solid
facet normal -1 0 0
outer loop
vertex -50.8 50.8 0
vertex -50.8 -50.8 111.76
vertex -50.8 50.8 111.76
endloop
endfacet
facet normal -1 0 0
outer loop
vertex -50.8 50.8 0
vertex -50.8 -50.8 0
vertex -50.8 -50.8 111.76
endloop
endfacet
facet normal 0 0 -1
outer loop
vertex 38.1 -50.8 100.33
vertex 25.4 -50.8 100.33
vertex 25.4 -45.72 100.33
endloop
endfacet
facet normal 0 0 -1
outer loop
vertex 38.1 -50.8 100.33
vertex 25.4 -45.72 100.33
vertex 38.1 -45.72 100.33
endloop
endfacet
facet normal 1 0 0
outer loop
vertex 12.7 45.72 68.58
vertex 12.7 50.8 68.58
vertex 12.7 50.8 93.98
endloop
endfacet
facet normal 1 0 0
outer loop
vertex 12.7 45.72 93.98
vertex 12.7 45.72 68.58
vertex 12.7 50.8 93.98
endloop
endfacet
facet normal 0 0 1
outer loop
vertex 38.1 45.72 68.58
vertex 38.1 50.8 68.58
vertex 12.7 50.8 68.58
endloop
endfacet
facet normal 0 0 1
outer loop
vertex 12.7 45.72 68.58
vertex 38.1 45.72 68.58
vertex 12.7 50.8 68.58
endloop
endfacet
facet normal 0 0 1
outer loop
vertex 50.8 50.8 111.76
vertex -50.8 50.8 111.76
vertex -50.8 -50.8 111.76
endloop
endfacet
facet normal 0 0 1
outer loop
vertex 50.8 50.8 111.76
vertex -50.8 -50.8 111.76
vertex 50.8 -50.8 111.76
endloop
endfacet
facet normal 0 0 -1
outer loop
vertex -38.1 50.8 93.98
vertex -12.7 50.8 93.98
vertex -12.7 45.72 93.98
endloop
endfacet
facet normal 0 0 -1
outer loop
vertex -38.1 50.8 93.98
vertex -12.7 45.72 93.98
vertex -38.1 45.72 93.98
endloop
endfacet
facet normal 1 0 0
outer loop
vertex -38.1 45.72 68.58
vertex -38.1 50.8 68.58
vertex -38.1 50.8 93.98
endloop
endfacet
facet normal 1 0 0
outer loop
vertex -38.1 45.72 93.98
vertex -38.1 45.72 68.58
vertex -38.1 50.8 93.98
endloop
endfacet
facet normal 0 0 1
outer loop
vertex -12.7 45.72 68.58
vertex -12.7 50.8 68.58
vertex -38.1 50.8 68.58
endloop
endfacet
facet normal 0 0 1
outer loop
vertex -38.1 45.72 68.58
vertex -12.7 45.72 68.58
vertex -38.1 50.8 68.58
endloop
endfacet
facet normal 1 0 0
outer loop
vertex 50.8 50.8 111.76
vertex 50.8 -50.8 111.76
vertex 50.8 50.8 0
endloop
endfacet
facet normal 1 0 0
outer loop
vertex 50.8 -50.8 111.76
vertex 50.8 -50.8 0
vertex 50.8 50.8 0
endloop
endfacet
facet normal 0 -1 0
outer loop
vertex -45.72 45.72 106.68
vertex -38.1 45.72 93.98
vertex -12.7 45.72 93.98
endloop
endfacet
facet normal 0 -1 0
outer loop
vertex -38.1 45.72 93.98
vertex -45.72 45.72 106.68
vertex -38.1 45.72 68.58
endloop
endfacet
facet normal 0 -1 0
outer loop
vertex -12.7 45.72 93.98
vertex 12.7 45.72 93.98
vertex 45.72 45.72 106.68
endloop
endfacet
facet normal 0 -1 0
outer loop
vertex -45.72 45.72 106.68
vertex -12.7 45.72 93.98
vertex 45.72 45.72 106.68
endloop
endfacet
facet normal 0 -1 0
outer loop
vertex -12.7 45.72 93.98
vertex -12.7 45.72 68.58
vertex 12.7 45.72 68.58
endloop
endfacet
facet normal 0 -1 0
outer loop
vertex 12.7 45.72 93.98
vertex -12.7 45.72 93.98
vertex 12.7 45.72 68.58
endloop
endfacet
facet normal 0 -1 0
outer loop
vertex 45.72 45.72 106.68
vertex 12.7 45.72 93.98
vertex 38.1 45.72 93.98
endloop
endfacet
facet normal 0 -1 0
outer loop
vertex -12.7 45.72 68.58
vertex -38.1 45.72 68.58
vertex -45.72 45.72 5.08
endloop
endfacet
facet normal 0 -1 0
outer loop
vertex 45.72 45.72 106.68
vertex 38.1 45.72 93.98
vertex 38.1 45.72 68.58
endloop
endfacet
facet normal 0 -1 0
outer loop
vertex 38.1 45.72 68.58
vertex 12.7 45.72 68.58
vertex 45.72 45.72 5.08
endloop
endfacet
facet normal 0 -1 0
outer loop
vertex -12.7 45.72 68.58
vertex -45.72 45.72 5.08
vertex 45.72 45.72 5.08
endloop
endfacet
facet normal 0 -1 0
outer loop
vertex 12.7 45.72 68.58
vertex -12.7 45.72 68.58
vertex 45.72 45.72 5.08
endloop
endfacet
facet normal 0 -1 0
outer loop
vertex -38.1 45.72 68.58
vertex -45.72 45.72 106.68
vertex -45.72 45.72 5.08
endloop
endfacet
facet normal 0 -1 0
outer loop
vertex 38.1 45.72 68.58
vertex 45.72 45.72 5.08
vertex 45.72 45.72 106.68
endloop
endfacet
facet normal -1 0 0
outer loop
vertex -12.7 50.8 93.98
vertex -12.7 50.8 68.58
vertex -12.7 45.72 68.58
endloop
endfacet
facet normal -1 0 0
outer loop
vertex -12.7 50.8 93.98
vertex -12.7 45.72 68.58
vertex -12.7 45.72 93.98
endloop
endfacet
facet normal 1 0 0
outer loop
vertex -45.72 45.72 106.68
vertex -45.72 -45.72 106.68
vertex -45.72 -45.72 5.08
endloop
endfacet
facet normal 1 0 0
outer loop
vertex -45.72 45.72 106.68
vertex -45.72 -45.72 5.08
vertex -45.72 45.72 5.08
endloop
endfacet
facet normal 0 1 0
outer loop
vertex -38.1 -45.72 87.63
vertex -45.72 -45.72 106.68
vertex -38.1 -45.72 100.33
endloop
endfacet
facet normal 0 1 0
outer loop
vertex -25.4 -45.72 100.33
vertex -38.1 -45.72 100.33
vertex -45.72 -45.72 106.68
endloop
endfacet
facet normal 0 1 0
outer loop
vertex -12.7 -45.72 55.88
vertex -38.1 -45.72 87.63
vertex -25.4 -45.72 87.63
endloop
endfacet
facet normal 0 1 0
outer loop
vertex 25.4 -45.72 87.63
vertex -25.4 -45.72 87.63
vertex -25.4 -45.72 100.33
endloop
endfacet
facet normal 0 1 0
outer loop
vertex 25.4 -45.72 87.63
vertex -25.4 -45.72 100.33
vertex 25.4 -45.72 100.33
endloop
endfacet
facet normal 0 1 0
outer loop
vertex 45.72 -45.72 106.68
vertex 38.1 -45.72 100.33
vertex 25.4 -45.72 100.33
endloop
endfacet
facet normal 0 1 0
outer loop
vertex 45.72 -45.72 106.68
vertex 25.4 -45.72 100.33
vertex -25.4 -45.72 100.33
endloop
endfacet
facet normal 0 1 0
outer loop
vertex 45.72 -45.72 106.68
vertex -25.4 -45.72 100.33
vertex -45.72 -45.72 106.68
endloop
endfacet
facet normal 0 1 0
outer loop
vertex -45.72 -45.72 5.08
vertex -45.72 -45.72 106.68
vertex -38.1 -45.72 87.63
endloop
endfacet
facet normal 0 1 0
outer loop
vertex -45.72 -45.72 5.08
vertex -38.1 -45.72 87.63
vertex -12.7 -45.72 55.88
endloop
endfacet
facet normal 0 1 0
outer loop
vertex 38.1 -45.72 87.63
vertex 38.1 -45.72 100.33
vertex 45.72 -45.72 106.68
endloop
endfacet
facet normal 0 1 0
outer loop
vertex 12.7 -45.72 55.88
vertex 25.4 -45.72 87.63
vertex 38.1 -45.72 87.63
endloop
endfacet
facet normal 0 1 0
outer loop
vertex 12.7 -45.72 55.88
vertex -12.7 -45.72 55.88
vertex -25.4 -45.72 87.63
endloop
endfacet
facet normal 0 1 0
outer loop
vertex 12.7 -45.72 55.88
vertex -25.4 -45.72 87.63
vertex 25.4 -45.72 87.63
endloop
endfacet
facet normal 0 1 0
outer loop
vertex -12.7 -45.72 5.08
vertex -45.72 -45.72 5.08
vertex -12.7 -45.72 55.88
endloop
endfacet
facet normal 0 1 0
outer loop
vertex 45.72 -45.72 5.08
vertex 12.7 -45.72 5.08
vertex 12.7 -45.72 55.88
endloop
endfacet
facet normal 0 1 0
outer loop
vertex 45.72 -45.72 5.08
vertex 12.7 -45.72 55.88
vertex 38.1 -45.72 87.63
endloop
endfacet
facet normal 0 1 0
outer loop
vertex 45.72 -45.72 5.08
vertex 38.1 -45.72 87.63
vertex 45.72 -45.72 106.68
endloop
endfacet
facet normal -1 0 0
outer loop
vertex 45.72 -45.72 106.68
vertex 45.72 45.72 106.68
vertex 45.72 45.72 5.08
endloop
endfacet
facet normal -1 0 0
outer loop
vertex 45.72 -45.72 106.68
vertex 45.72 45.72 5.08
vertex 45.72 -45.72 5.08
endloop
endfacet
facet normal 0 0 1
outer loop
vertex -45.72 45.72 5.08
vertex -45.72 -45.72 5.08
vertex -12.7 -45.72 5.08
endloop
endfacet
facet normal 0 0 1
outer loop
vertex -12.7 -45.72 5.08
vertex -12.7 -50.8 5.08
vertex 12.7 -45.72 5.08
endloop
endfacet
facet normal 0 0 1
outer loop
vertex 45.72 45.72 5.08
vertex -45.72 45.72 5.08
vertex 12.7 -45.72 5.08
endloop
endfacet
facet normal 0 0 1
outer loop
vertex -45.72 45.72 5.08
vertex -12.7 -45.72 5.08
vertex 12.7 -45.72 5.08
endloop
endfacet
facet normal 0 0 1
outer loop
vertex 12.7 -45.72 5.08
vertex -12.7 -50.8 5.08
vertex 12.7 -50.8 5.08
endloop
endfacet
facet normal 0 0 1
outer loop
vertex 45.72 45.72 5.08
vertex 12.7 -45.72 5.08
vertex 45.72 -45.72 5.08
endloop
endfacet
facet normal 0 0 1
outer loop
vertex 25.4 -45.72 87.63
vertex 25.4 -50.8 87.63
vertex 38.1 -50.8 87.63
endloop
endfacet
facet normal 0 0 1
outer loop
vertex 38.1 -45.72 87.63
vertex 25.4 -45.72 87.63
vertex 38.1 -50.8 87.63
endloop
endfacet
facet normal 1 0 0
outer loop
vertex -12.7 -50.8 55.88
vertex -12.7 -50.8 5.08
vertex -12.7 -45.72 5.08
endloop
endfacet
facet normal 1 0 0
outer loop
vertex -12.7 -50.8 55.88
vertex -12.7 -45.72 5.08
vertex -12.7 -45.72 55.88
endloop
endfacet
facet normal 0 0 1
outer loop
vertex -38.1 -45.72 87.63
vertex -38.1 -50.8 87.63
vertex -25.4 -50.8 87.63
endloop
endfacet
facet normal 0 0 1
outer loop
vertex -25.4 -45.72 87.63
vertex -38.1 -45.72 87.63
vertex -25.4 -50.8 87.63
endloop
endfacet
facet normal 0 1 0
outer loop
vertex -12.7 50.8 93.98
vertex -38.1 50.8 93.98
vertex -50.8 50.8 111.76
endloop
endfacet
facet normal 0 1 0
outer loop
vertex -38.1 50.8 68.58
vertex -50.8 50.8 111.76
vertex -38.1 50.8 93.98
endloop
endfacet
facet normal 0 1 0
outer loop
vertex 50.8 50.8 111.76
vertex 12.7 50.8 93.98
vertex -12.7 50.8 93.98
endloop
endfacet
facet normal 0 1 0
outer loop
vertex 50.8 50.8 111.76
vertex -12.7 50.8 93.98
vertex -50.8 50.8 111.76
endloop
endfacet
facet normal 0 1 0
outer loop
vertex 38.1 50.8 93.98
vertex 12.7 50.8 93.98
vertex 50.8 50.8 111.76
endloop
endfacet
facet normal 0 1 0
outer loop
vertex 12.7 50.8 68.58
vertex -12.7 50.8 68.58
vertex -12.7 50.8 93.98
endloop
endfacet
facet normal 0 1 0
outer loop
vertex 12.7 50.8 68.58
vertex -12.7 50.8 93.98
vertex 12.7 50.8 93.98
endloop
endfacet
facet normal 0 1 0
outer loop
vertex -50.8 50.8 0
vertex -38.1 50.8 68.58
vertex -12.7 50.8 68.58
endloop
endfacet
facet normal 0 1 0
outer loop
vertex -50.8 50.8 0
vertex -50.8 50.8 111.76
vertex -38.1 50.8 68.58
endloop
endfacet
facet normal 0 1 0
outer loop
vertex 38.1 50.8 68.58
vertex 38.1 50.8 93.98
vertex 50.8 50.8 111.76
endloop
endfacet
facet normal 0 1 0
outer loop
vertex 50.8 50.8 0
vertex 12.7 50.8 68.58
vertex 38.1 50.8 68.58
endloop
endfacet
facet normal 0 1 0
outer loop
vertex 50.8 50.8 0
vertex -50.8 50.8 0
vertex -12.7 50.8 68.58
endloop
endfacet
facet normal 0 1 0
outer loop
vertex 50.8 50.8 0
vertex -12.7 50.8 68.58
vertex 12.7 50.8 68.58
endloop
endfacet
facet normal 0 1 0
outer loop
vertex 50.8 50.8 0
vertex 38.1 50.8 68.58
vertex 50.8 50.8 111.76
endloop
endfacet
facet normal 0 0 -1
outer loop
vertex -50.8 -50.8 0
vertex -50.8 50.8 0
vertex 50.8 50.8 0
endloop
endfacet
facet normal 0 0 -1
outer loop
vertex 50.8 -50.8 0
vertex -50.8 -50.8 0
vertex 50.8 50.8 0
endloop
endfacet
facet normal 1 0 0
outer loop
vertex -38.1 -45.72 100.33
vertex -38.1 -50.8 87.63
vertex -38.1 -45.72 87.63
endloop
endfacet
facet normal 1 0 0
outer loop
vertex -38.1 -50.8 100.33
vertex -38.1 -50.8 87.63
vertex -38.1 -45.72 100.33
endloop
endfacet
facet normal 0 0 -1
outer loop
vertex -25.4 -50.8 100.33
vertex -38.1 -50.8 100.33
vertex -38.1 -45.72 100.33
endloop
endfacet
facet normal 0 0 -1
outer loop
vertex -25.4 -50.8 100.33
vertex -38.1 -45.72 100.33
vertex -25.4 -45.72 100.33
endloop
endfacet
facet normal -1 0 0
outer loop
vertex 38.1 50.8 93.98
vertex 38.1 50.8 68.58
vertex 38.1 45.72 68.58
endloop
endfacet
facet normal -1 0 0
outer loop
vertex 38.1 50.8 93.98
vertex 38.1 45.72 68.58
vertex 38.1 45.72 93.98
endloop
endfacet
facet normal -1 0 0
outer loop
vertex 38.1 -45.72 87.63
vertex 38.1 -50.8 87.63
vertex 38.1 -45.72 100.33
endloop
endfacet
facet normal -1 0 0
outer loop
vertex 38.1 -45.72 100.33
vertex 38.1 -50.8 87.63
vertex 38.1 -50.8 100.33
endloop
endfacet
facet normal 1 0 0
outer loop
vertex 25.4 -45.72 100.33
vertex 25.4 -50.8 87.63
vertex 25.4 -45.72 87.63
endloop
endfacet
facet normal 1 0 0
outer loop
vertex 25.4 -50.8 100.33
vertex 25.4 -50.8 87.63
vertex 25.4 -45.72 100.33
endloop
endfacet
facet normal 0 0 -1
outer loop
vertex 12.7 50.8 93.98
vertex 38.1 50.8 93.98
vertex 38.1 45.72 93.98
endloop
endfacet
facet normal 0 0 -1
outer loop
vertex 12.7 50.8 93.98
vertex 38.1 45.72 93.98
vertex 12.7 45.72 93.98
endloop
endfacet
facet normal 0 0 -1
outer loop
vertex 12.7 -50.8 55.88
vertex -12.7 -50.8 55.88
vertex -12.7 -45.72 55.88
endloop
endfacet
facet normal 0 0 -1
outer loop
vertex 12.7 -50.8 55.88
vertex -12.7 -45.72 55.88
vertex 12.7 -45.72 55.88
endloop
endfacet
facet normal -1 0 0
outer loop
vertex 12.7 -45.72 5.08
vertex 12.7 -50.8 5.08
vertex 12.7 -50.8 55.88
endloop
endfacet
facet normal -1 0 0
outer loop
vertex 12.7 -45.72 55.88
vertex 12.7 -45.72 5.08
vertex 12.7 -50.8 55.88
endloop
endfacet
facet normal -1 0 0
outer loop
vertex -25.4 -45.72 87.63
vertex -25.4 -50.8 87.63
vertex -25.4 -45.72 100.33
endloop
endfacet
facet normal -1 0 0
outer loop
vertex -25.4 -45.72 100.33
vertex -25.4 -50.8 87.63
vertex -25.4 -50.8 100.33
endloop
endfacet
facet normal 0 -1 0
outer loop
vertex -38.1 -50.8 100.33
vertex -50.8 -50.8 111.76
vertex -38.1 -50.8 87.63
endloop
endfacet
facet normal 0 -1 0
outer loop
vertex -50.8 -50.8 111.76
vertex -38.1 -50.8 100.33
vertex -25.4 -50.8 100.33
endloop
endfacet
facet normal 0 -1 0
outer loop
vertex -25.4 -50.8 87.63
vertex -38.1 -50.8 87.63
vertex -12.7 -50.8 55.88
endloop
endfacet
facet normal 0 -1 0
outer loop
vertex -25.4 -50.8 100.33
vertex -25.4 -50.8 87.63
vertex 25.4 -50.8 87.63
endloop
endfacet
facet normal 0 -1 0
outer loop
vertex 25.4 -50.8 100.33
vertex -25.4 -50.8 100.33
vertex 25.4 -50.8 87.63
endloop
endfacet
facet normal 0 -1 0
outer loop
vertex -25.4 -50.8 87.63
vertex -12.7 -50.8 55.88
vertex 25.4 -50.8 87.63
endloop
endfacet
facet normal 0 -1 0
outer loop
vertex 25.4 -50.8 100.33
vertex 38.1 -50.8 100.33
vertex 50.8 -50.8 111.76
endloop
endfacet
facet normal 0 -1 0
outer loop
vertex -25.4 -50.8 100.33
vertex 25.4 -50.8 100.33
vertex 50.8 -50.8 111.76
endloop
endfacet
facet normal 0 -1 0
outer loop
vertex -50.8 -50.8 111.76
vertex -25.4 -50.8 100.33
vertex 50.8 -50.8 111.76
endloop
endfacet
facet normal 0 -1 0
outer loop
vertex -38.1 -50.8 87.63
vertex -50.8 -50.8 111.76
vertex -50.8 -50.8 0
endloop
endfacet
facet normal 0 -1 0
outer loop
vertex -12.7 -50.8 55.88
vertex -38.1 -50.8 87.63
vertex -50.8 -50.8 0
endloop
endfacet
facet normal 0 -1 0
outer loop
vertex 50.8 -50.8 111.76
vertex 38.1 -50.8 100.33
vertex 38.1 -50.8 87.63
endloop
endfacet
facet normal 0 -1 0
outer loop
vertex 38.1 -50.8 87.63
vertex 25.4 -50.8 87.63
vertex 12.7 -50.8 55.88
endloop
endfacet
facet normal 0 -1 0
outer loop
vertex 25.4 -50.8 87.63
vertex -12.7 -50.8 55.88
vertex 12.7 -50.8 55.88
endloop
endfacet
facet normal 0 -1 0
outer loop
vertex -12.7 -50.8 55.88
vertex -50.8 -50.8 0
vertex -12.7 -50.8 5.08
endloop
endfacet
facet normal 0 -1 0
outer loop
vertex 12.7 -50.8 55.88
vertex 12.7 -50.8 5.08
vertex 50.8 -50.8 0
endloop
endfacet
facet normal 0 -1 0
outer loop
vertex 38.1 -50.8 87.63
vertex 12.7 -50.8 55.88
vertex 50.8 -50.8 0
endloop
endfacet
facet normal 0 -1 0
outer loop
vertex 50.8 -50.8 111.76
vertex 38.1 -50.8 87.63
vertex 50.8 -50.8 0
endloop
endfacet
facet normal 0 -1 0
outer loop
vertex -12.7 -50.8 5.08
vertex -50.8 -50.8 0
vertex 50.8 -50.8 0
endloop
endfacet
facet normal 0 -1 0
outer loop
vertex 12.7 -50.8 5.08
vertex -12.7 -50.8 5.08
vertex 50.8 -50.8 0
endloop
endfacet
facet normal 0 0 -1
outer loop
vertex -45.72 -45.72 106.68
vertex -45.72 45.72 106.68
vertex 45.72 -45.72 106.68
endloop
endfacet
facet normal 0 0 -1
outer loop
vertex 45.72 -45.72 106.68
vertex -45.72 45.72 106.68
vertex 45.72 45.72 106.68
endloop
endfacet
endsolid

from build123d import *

# Parameters (mm, degrees)
F0_W     = 101.6
F0_H     = 101.6
F1_DEPTH = 5.08
F2_W     = 91.44
F2_H     = 5.08
F3_DEPTH = 101.6
F4_W     = 25.4
F4_H     = 50.8
F4_W_2   = 12.7
F4_H_2   = 12.7
F5_DEPTH = 5.08
F6_W     = 25.4
F6_H     = 25.4
F7_DEPTH = 5.08
F8_W     = 101.6
F8_H     = 101.6
F9_DEPTH = 5.08


with BuildPart() as f1:
    # F0 (on Top) → F1 (new body)
    with BuildSketch(Plane.XY):
        Rectangle(F0_W, F0_H)
    extrude(amount=F1_DEPTH)

    # F2 (on face) → F3 (join)
    with BuildSketch(Plane.XY.offset(5.08)):
        Polygon((-45.72, 50.8), (-50.8, 50.8), (-50.8, -50.8), (-45.72, -50.8), (-45.72, -45.72), (-45.72, 45.72), align=None)
        with Locations((0, 48.26)):
            Rectangle(F2_W, F2_H)
        Polygon((50.8, 50.8), (45.72, 50.8), (45.72, 45.72), (45.72, -45.72), (45.72, -50.8), (50.8, -50.8), align=None)
        with Locations((0, -48.26)):
            Rectangle(F2_W, F2_H)
    extrude(amount=F3_DEPTH)

    # F4 (on face) → F5 (cut, through all)
    with BuildSketch(Plane.XZ.offset(50.8)):
        with Locations((0, 30.48)):
            Rectangle(F4_W, F4_H)
        with Locations((-31.75, 93.98)):
            Rectangle(F4_W_2, F4_H_2)
        with Locations((31.75, 93.98)):
            Rectangle(F4_W_2, F4_H_2)
    extrude(amount=-F5_DEPTH, mode=Mode.SUBTRACT)

    # F6 (on face) → F7 (cut, through all)
    with BuildSketch(Plane(origin=(0, 50.8, 0), x_dir=(-1, 0, 0), z_dir=(0, 1, 0))):
        with Locations((-25.4, 81.28)):
            Rectangle(F6_W, F6_H)
        with Locations((25.4, 81.28)):
            Rectangle(F6_W, F6_H)
    extrude(amount=-F7_DEPTH, mode=Mode.SUBTRACT)

    # F8 (on face) → F9 (join)
    with BuildSketch(Plane.XY.offset(106.68)):
        Rectangle(F8_W, F8_H)
    extrude(amount=F9_DEPTH)


solid = f1.part
